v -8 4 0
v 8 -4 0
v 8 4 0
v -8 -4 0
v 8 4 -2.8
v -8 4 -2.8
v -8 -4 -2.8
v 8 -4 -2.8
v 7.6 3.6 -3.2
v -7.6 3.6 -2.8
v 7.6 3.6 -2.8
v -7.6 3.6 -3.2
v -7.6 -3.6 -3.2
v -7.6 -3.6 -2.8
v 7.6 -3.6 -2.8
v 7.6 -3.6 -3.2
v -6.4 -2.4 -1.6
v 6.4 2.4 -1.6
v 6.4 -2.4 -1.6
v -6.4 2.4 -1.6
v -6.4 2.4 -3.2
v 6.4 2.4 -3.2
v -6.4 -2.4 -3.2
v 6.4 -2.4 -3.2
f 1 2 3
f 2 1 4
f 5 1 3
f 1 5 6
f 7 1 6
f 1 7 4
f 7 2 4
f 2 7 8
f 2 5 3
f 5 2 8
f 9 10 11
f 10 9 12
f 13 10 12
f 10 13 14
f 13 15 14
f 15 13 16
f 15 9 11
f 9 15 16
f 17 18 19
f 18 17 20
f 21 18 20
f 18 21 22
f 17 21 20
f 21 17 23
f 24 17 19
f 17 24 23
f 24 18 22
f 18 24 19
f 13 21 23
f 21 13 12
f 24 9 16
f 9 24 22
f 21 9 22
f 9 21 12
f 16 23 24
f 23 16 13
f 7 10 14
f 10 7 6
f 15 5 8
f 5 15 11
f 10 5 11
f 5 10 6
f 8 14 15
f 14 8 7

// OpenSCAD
// file: ../p/box5.scad
use <../lib.scad>
function ldraw_lib__box5() = [
// 0 Box with 5 Faces and All Edges
// 0 Name: box5.dat
// 0 Author: James Jessiman
// 0 !LDRAW_ORG Primitive UPDATE 2012-01
// 0 !LICENSE Licensed under CC BY 2.0 and CC BY 4.0 : see CAreadme.txt
// 
// 0 BFC CERTIFY CCW
  [0,"BFC","CERTIFY"],
  [0,"BFC","CCW"],
// 
// 0 !HISTORY 2002-04-03 [sbliss] Modified for BFC compliance
// 0 !HISTORY 2002-04-25 [PTadmin] Official Update 2002-02
// 0 !HISTORY 2007-06-24 [PTadmin] Header formatted for Contributor Agreement
// 0 !HISTORY 2008-07-01 [PTadmin] Official Update 2008-01
// 0 !HISTORY 2012-02-16 [Philo] Changed to CCW
// 0 !HISTORY 2012-03-30 [PTadmin] Official Update 2012-01
// 
// 
// 2 24 1 1 1 -1 1 1
  [2,24,1,1,1,-1,1,1],
// 2 24 -1 1 1 -1 1 -1
  [2,24,-1,1,1,-1,1,-1],
// 2 24 -1 1 -1 1 1 -1
  [2,24,-1,1,-1,1,1,-1],
// 2 24 1 1 -1 1 1 1
  [2,24,1,1,-1,1,1,1],
// 2 24 1 0 1 -1 0 1
  [2,24,1,0,1,-1,0,1],
// 2 24 -1 0 1 -1 0 -1
  [2,24,-1,0,1,-1,0,-1],
// 2 24 -1 0 -1 1 0 -1
  [2,24,-1,0,-1,1,0,-1],
// 2 24 1 0 -1 1 0 1
  [2,24,1,0,-1,1,0,1],
// 2 24 1 0 1 1 1 1
  [2,24,1,0,1,1,1,1],
// 2 24 -1 0 1 -1 1 1
  [2,24,-1,0,1,-1,1,1],
// 2 24 1 0 -1 1 1 -1
  [2,24,1,0,-1,1,1,-1],
// 2 24 -1 0 -1 -1 1 -1
  [2,24,-1,0,-1,-1,1,-1],
// 4 16 -1 1 1 1 1 1 1 1 -1 -1 1 -1
  [4,16,-1,1,1,1,1,1,1,1,-1,-1,1,-1],
// 4 16 -1 1 1 -1 0 1 1 0 1 1 1 1
  [4,16,-1,1,1,-1,0,1,1,0,1,1,1,1],
// 4 16 -1 1 -1 -1 0 -1 -1 0 1 -1 1 1
  [4,16,-1,1,-1,-1,0,-1,-1,0,1,-1,1,1],
// 4 16 1 1 -1 1 0 -1 -1 0 -1 -1 1 -1
  [4,16,1,1,-1,1,0,-1,-1,0,-1,-1,1,-1],
// 4 16 1 1 1 1 0 1 1 0 -1 1 1 -1
  [4,16,1,1,1,1,0,1,1,0,-1,1,1,-1],
];
makepoly(ldraw_lib__box5(), line=0.2);
// file: ../p/box4.scad
use <../lib.scad>
function ldraw_lib__box4() = [
// 0 Box with 4 Faces (2 Parallel Pairs) and All Edges
// 0 Name: box4.dat
// 0 Author: James Jessiman
// 0 !LDRAW_ORG Primitive UPDATE 2012-01
// 0 !LICENSE Licensed under CC BY 2.0 and CC BY 4.0 : see CAreadme.txt
// 
// 0 BFC CERTIFY CCW
  [0,"BFC","CERTIFY"],
  [0,"BFC","CCW"],
// 
// 0 !HISTORY 2002-04-03 [sbliss] Modified for BFC compliance
// 0 !HISTORY 2002-04-25 [PTadmin] Official Update 2002-02
// 0 !HISTORY 2007-06-24 [PTadmin] Header formatted for Contributor Agreement
// 0 !HISTORY 2008-07-01 [PTadmin] Official Update 2008-01
// 0 !HISTORY 2012-02-16 [Philo] Changed to CCW
// 0 !HISTORY 2012-03-30 [PTadmin] Official Update 2012-01
// 
// 
// 2 24 1 1 1 -1 1 1
  [2,24,1,1,1,-1,1,1],
// 2 24 -1 1 1 -1 1 -1
  [2,24,-1,1,1,-1,1,-1],
// 2 24 -1 1 -1 1 1 -1
  [2,24,-1,1,-1,1,1,-1],
// 2 24 1 1 -1 1 1 1
  [2,24,1,1,-1,1,1,1],
// 2 24 1 0 1 -1 0 1
  [2,24,1,0,1,-1,0,1],
// 2 24 -1 0 1 -1 0 -1
  [2,24,-1,0,1,-1,0,-1],
// 2 24 -1 0 -1 1 0 -1
  [2,24,-1,0,-1,1,0,-1],
// 2 24 1 0 -1 1 0 1
  [2,24,1,0,-1,1,0,1],
// 2 24 1 0 1 1 1 1
  [2,24,1,0,1,1,1,1],
// 2 24 -1 0 1 -1 1 1
  [2,24,-1,0,1,-1,1,1],
// 2 24 1 0 -1 1 1 -1
  [2,24,1,0,-1,1,1,-1],
// 2 24 -1 0 -1 -1 1 -1
  [2,24,-1,0,-1,-1,1,-1],
// 4 16 -1 1 1 -1 0 1 1 0 1 1 1 1
  [4,16,-1,1,1,-1,0,1,1,0,1,1,1,1],
// 4 16 -1 1 -1 -1 0 -1 -1 0 1 -1 1 1
  [4,16,-1,1,-1,-1,0,-1,-1,0,1,-1,1,1],
// 4 16 1 1 -1 1 0 -1 -1 0 -1 -1 1 -1
  [4,16,1,1,-1,1,0,-1,-1,0,-1,-1,1,-1],
// 4 16 1 1 1 1 0 1 1 0 -1 1 1 -1
  [4,16,1,1,1,1,0,1,1,0,-1,1,1,-1],
];
makepoly(ldraw_lib__box4(), line=0.2);
// file: s/3069bs01.scad
use <../../lib.scad>
use <../../p/box4.scad>
use <../../p/box5.scad>
function ldraw_lib__s__3069bs01() = [
// 0 ~Tile  1 x  2 with Groove without Top Face
// 0 Name: s\3069bs01.dat
// 0 Author: Santeri Piippo [arezey]
// 0 !LDRAW_ORG Subpart UPDATE 2010-02
// 0 !LICENSE Licensed under CC BY 2.0 and CC BY 4.0 : see CAreadme.txt
// 
// 0 BFC CERTIFY CCW
  [0,"BFC","CERTIFY"],
  [0,"BFC","CCW"],
// 
// 0 !HISTORY 2010-07-05 [PTadmin] Official Update 2010-02
// 
// 
// 1 16 0 0 0 20 0 0 0 7 0 0 0 10 box4.dat
  [1,16,0,0,0,20,0,0,0,7,0,0,0,10, ldraw_lib__box4()],
// 1 16 0 7 0 19 0 0 0 1 0 0 0 9 box4.dat
  [1,16,0,7,0,19,0,0,0,1,0,0,0,9, ldraw_lib__box4()],
// 0 BFC INVERTNEXT
  [0,"BFC","INVERTNEXT"],
// 1 16 0 8 0 16 0 0 0 -4 0 0 0 6 box5.dat
  [1,16,0,8,0,16,0,0,0,-4,0,0,0,6, ldraw_lib__box5()],
// 4 16 -19 8 9 -16 8 6 -16 8 -6 -19 8 -9
  [4,16,-19,8,9,-16,8,6,-16,8,-6,-19,8,-9],
// 4 16 19 8 -9 16 8 -6 16 8 6 19 8 9
  [4,16,19,8,-9,16,8,-6,16,8,6,19,8,9],
// 4 16 19 8 9 16 8 6 -16 8 6 -19 8 9
  [4,16,19,8,9,16,8,6,-16,8,6,-19,8,9],
// 4 16 -19 8 -9 -16 8 -6 16 8 -6 19 8 -9
  [4,16,-19,8,-9,-16,8,-6,16,8,-6,19,8,-9],
// 4 16 -20 7 10 -19 7 9 -19 7 -9 -20 7 -10
  [4,16,-20,7,10,-19,7,9,-19,7,-9,-20,7,-10],
// 4 16 20 7 -10 19 7 -9 19 7 9 20 7 10
  [4,16,20,7,-10,19,7,-9,19,7,9,20,7,10],
// 4 16 20 7 10 19 7 9 -19 7 9 -20 7 10
  [4,16,20,7,10,19,7,9,-19,7,9,-20,7,10],
// 4 16 -20 7 -10 -19 7 -9 19 7 -9 20 7 -10
  [4,16,-20,7,-10,-19,7,-9,19,7,-9,20,7,-10],
// 0 //
];
makepoly(ldraw_lib__s__3069bs01(), line=0.2);
// file: 3069b.scad
use <../lib.scad>
use <s/3069bs01.scad>
function ldraw_lib__3069b() = [
// 0 Tile  1 x  2 with Groove
// 0 Name: 3069b.dat
// 0 Author: Santeri Piippo [arezey]
// 0 !LDRAW_ORG Part UPDATE 2010-02
// 0 !LICENSE Licensed under CC BY 2.0 and CC BY 4.0 : see CAreadme.txt
// 
// 0 BFC CERTIFY CCW
  [0,"BFC","CERTIFY"],
  [0,"BFC","CCW"],
// 
// 0 !HISTORY 2010-07-05 [PTadmin] Official Update 2010-02
// 
// 
// 4 16 20 0 -10 20 0 10 -20 0 10 -20 0 -10
  [4,16,20,0,-10,20,0,10,-20,0,10,-20,0,-10],
// 1 16 0 0 0 1 0 0 0 1 0 0 0 1 s\3069bs01.dat
  [1,16,0,0,0,1,0,0,0,1,0,0,0,1, ldraw_lib__s__3069bs01()],
// 0 //
];
makepoly(ldraw_lib__3069b(), line=0.2);
// file: 30070.scad
use <../lib.scad>
use <3069b.scad>
function ldraw_lib__30070() = [
// 0 =Tile  1 x  2 with Groove
// 0 Name: 30070.dat
// 0 Author: Rolf Osterthun [Rolf]
// 0 !LDRAW_ORG Part Alias UPDATE 2013-02
// 0 !LICENSE Licensed under CC BY 2.0 and CC BY 4.0 : see CAreadme.txt
// 
// 0 BFC CERTIFY CCW
  [0,"BFC","CERTIFY"],
  [0,"BFC","CCW"],
// 
// 0 !HISTORY 2013-12-23 [PTadmin] Official Update 2013-02
// 
// 
// 0 // Alias of 3069b
// 0 // Part 30070 is the transparent counterpart of 3069b
// 
// 1 16 0 0 0 1 0 0 0 1 0 0 0 1 3069b.dat
  [1,16,0,0,0,1,0,0,0,1,0,0,0,1, ldraw_lib__3069b()],
];
makepoly(ldraw_lib__30070(), line=0.2);
// main file
use <../lib.scad>
use <30070.scad>
function ldraw_lib__35386() = [
// 0 =Tile  1 x  2 with Groove
// 0 Name: 35386.dat
// 0 Author: [PTadmin]
// 0 !LDRAW_ORG Part Alias UPDATE 2018-02
// 0 !LICENSE Licensed under CC BY 4.0 : see CAreadme.txt
// 
// 0 BFC CERTIFY CCW
  [0,"BFC","CERTIFY"],
  [0,"BFC","CCW"],
// 
// 0 !HISTORY 2018-12-08 [PTadmin] Official Update 2018-02
// 
// 
// 0 // Alias of 30070
// 0 // Part 35386 is an alias of 30070, the transparent counterpart of 3069b
// 
// 1 16 0 0 0 1 0 0 0 1 0 0 0 1 30070.dat
  [1,16,0,0,0,1,0,0,0,1,0,0,0,1, ldraw_lib__30070()],
];
makepoly(ldraw_lib__35386(), line=0.2);
